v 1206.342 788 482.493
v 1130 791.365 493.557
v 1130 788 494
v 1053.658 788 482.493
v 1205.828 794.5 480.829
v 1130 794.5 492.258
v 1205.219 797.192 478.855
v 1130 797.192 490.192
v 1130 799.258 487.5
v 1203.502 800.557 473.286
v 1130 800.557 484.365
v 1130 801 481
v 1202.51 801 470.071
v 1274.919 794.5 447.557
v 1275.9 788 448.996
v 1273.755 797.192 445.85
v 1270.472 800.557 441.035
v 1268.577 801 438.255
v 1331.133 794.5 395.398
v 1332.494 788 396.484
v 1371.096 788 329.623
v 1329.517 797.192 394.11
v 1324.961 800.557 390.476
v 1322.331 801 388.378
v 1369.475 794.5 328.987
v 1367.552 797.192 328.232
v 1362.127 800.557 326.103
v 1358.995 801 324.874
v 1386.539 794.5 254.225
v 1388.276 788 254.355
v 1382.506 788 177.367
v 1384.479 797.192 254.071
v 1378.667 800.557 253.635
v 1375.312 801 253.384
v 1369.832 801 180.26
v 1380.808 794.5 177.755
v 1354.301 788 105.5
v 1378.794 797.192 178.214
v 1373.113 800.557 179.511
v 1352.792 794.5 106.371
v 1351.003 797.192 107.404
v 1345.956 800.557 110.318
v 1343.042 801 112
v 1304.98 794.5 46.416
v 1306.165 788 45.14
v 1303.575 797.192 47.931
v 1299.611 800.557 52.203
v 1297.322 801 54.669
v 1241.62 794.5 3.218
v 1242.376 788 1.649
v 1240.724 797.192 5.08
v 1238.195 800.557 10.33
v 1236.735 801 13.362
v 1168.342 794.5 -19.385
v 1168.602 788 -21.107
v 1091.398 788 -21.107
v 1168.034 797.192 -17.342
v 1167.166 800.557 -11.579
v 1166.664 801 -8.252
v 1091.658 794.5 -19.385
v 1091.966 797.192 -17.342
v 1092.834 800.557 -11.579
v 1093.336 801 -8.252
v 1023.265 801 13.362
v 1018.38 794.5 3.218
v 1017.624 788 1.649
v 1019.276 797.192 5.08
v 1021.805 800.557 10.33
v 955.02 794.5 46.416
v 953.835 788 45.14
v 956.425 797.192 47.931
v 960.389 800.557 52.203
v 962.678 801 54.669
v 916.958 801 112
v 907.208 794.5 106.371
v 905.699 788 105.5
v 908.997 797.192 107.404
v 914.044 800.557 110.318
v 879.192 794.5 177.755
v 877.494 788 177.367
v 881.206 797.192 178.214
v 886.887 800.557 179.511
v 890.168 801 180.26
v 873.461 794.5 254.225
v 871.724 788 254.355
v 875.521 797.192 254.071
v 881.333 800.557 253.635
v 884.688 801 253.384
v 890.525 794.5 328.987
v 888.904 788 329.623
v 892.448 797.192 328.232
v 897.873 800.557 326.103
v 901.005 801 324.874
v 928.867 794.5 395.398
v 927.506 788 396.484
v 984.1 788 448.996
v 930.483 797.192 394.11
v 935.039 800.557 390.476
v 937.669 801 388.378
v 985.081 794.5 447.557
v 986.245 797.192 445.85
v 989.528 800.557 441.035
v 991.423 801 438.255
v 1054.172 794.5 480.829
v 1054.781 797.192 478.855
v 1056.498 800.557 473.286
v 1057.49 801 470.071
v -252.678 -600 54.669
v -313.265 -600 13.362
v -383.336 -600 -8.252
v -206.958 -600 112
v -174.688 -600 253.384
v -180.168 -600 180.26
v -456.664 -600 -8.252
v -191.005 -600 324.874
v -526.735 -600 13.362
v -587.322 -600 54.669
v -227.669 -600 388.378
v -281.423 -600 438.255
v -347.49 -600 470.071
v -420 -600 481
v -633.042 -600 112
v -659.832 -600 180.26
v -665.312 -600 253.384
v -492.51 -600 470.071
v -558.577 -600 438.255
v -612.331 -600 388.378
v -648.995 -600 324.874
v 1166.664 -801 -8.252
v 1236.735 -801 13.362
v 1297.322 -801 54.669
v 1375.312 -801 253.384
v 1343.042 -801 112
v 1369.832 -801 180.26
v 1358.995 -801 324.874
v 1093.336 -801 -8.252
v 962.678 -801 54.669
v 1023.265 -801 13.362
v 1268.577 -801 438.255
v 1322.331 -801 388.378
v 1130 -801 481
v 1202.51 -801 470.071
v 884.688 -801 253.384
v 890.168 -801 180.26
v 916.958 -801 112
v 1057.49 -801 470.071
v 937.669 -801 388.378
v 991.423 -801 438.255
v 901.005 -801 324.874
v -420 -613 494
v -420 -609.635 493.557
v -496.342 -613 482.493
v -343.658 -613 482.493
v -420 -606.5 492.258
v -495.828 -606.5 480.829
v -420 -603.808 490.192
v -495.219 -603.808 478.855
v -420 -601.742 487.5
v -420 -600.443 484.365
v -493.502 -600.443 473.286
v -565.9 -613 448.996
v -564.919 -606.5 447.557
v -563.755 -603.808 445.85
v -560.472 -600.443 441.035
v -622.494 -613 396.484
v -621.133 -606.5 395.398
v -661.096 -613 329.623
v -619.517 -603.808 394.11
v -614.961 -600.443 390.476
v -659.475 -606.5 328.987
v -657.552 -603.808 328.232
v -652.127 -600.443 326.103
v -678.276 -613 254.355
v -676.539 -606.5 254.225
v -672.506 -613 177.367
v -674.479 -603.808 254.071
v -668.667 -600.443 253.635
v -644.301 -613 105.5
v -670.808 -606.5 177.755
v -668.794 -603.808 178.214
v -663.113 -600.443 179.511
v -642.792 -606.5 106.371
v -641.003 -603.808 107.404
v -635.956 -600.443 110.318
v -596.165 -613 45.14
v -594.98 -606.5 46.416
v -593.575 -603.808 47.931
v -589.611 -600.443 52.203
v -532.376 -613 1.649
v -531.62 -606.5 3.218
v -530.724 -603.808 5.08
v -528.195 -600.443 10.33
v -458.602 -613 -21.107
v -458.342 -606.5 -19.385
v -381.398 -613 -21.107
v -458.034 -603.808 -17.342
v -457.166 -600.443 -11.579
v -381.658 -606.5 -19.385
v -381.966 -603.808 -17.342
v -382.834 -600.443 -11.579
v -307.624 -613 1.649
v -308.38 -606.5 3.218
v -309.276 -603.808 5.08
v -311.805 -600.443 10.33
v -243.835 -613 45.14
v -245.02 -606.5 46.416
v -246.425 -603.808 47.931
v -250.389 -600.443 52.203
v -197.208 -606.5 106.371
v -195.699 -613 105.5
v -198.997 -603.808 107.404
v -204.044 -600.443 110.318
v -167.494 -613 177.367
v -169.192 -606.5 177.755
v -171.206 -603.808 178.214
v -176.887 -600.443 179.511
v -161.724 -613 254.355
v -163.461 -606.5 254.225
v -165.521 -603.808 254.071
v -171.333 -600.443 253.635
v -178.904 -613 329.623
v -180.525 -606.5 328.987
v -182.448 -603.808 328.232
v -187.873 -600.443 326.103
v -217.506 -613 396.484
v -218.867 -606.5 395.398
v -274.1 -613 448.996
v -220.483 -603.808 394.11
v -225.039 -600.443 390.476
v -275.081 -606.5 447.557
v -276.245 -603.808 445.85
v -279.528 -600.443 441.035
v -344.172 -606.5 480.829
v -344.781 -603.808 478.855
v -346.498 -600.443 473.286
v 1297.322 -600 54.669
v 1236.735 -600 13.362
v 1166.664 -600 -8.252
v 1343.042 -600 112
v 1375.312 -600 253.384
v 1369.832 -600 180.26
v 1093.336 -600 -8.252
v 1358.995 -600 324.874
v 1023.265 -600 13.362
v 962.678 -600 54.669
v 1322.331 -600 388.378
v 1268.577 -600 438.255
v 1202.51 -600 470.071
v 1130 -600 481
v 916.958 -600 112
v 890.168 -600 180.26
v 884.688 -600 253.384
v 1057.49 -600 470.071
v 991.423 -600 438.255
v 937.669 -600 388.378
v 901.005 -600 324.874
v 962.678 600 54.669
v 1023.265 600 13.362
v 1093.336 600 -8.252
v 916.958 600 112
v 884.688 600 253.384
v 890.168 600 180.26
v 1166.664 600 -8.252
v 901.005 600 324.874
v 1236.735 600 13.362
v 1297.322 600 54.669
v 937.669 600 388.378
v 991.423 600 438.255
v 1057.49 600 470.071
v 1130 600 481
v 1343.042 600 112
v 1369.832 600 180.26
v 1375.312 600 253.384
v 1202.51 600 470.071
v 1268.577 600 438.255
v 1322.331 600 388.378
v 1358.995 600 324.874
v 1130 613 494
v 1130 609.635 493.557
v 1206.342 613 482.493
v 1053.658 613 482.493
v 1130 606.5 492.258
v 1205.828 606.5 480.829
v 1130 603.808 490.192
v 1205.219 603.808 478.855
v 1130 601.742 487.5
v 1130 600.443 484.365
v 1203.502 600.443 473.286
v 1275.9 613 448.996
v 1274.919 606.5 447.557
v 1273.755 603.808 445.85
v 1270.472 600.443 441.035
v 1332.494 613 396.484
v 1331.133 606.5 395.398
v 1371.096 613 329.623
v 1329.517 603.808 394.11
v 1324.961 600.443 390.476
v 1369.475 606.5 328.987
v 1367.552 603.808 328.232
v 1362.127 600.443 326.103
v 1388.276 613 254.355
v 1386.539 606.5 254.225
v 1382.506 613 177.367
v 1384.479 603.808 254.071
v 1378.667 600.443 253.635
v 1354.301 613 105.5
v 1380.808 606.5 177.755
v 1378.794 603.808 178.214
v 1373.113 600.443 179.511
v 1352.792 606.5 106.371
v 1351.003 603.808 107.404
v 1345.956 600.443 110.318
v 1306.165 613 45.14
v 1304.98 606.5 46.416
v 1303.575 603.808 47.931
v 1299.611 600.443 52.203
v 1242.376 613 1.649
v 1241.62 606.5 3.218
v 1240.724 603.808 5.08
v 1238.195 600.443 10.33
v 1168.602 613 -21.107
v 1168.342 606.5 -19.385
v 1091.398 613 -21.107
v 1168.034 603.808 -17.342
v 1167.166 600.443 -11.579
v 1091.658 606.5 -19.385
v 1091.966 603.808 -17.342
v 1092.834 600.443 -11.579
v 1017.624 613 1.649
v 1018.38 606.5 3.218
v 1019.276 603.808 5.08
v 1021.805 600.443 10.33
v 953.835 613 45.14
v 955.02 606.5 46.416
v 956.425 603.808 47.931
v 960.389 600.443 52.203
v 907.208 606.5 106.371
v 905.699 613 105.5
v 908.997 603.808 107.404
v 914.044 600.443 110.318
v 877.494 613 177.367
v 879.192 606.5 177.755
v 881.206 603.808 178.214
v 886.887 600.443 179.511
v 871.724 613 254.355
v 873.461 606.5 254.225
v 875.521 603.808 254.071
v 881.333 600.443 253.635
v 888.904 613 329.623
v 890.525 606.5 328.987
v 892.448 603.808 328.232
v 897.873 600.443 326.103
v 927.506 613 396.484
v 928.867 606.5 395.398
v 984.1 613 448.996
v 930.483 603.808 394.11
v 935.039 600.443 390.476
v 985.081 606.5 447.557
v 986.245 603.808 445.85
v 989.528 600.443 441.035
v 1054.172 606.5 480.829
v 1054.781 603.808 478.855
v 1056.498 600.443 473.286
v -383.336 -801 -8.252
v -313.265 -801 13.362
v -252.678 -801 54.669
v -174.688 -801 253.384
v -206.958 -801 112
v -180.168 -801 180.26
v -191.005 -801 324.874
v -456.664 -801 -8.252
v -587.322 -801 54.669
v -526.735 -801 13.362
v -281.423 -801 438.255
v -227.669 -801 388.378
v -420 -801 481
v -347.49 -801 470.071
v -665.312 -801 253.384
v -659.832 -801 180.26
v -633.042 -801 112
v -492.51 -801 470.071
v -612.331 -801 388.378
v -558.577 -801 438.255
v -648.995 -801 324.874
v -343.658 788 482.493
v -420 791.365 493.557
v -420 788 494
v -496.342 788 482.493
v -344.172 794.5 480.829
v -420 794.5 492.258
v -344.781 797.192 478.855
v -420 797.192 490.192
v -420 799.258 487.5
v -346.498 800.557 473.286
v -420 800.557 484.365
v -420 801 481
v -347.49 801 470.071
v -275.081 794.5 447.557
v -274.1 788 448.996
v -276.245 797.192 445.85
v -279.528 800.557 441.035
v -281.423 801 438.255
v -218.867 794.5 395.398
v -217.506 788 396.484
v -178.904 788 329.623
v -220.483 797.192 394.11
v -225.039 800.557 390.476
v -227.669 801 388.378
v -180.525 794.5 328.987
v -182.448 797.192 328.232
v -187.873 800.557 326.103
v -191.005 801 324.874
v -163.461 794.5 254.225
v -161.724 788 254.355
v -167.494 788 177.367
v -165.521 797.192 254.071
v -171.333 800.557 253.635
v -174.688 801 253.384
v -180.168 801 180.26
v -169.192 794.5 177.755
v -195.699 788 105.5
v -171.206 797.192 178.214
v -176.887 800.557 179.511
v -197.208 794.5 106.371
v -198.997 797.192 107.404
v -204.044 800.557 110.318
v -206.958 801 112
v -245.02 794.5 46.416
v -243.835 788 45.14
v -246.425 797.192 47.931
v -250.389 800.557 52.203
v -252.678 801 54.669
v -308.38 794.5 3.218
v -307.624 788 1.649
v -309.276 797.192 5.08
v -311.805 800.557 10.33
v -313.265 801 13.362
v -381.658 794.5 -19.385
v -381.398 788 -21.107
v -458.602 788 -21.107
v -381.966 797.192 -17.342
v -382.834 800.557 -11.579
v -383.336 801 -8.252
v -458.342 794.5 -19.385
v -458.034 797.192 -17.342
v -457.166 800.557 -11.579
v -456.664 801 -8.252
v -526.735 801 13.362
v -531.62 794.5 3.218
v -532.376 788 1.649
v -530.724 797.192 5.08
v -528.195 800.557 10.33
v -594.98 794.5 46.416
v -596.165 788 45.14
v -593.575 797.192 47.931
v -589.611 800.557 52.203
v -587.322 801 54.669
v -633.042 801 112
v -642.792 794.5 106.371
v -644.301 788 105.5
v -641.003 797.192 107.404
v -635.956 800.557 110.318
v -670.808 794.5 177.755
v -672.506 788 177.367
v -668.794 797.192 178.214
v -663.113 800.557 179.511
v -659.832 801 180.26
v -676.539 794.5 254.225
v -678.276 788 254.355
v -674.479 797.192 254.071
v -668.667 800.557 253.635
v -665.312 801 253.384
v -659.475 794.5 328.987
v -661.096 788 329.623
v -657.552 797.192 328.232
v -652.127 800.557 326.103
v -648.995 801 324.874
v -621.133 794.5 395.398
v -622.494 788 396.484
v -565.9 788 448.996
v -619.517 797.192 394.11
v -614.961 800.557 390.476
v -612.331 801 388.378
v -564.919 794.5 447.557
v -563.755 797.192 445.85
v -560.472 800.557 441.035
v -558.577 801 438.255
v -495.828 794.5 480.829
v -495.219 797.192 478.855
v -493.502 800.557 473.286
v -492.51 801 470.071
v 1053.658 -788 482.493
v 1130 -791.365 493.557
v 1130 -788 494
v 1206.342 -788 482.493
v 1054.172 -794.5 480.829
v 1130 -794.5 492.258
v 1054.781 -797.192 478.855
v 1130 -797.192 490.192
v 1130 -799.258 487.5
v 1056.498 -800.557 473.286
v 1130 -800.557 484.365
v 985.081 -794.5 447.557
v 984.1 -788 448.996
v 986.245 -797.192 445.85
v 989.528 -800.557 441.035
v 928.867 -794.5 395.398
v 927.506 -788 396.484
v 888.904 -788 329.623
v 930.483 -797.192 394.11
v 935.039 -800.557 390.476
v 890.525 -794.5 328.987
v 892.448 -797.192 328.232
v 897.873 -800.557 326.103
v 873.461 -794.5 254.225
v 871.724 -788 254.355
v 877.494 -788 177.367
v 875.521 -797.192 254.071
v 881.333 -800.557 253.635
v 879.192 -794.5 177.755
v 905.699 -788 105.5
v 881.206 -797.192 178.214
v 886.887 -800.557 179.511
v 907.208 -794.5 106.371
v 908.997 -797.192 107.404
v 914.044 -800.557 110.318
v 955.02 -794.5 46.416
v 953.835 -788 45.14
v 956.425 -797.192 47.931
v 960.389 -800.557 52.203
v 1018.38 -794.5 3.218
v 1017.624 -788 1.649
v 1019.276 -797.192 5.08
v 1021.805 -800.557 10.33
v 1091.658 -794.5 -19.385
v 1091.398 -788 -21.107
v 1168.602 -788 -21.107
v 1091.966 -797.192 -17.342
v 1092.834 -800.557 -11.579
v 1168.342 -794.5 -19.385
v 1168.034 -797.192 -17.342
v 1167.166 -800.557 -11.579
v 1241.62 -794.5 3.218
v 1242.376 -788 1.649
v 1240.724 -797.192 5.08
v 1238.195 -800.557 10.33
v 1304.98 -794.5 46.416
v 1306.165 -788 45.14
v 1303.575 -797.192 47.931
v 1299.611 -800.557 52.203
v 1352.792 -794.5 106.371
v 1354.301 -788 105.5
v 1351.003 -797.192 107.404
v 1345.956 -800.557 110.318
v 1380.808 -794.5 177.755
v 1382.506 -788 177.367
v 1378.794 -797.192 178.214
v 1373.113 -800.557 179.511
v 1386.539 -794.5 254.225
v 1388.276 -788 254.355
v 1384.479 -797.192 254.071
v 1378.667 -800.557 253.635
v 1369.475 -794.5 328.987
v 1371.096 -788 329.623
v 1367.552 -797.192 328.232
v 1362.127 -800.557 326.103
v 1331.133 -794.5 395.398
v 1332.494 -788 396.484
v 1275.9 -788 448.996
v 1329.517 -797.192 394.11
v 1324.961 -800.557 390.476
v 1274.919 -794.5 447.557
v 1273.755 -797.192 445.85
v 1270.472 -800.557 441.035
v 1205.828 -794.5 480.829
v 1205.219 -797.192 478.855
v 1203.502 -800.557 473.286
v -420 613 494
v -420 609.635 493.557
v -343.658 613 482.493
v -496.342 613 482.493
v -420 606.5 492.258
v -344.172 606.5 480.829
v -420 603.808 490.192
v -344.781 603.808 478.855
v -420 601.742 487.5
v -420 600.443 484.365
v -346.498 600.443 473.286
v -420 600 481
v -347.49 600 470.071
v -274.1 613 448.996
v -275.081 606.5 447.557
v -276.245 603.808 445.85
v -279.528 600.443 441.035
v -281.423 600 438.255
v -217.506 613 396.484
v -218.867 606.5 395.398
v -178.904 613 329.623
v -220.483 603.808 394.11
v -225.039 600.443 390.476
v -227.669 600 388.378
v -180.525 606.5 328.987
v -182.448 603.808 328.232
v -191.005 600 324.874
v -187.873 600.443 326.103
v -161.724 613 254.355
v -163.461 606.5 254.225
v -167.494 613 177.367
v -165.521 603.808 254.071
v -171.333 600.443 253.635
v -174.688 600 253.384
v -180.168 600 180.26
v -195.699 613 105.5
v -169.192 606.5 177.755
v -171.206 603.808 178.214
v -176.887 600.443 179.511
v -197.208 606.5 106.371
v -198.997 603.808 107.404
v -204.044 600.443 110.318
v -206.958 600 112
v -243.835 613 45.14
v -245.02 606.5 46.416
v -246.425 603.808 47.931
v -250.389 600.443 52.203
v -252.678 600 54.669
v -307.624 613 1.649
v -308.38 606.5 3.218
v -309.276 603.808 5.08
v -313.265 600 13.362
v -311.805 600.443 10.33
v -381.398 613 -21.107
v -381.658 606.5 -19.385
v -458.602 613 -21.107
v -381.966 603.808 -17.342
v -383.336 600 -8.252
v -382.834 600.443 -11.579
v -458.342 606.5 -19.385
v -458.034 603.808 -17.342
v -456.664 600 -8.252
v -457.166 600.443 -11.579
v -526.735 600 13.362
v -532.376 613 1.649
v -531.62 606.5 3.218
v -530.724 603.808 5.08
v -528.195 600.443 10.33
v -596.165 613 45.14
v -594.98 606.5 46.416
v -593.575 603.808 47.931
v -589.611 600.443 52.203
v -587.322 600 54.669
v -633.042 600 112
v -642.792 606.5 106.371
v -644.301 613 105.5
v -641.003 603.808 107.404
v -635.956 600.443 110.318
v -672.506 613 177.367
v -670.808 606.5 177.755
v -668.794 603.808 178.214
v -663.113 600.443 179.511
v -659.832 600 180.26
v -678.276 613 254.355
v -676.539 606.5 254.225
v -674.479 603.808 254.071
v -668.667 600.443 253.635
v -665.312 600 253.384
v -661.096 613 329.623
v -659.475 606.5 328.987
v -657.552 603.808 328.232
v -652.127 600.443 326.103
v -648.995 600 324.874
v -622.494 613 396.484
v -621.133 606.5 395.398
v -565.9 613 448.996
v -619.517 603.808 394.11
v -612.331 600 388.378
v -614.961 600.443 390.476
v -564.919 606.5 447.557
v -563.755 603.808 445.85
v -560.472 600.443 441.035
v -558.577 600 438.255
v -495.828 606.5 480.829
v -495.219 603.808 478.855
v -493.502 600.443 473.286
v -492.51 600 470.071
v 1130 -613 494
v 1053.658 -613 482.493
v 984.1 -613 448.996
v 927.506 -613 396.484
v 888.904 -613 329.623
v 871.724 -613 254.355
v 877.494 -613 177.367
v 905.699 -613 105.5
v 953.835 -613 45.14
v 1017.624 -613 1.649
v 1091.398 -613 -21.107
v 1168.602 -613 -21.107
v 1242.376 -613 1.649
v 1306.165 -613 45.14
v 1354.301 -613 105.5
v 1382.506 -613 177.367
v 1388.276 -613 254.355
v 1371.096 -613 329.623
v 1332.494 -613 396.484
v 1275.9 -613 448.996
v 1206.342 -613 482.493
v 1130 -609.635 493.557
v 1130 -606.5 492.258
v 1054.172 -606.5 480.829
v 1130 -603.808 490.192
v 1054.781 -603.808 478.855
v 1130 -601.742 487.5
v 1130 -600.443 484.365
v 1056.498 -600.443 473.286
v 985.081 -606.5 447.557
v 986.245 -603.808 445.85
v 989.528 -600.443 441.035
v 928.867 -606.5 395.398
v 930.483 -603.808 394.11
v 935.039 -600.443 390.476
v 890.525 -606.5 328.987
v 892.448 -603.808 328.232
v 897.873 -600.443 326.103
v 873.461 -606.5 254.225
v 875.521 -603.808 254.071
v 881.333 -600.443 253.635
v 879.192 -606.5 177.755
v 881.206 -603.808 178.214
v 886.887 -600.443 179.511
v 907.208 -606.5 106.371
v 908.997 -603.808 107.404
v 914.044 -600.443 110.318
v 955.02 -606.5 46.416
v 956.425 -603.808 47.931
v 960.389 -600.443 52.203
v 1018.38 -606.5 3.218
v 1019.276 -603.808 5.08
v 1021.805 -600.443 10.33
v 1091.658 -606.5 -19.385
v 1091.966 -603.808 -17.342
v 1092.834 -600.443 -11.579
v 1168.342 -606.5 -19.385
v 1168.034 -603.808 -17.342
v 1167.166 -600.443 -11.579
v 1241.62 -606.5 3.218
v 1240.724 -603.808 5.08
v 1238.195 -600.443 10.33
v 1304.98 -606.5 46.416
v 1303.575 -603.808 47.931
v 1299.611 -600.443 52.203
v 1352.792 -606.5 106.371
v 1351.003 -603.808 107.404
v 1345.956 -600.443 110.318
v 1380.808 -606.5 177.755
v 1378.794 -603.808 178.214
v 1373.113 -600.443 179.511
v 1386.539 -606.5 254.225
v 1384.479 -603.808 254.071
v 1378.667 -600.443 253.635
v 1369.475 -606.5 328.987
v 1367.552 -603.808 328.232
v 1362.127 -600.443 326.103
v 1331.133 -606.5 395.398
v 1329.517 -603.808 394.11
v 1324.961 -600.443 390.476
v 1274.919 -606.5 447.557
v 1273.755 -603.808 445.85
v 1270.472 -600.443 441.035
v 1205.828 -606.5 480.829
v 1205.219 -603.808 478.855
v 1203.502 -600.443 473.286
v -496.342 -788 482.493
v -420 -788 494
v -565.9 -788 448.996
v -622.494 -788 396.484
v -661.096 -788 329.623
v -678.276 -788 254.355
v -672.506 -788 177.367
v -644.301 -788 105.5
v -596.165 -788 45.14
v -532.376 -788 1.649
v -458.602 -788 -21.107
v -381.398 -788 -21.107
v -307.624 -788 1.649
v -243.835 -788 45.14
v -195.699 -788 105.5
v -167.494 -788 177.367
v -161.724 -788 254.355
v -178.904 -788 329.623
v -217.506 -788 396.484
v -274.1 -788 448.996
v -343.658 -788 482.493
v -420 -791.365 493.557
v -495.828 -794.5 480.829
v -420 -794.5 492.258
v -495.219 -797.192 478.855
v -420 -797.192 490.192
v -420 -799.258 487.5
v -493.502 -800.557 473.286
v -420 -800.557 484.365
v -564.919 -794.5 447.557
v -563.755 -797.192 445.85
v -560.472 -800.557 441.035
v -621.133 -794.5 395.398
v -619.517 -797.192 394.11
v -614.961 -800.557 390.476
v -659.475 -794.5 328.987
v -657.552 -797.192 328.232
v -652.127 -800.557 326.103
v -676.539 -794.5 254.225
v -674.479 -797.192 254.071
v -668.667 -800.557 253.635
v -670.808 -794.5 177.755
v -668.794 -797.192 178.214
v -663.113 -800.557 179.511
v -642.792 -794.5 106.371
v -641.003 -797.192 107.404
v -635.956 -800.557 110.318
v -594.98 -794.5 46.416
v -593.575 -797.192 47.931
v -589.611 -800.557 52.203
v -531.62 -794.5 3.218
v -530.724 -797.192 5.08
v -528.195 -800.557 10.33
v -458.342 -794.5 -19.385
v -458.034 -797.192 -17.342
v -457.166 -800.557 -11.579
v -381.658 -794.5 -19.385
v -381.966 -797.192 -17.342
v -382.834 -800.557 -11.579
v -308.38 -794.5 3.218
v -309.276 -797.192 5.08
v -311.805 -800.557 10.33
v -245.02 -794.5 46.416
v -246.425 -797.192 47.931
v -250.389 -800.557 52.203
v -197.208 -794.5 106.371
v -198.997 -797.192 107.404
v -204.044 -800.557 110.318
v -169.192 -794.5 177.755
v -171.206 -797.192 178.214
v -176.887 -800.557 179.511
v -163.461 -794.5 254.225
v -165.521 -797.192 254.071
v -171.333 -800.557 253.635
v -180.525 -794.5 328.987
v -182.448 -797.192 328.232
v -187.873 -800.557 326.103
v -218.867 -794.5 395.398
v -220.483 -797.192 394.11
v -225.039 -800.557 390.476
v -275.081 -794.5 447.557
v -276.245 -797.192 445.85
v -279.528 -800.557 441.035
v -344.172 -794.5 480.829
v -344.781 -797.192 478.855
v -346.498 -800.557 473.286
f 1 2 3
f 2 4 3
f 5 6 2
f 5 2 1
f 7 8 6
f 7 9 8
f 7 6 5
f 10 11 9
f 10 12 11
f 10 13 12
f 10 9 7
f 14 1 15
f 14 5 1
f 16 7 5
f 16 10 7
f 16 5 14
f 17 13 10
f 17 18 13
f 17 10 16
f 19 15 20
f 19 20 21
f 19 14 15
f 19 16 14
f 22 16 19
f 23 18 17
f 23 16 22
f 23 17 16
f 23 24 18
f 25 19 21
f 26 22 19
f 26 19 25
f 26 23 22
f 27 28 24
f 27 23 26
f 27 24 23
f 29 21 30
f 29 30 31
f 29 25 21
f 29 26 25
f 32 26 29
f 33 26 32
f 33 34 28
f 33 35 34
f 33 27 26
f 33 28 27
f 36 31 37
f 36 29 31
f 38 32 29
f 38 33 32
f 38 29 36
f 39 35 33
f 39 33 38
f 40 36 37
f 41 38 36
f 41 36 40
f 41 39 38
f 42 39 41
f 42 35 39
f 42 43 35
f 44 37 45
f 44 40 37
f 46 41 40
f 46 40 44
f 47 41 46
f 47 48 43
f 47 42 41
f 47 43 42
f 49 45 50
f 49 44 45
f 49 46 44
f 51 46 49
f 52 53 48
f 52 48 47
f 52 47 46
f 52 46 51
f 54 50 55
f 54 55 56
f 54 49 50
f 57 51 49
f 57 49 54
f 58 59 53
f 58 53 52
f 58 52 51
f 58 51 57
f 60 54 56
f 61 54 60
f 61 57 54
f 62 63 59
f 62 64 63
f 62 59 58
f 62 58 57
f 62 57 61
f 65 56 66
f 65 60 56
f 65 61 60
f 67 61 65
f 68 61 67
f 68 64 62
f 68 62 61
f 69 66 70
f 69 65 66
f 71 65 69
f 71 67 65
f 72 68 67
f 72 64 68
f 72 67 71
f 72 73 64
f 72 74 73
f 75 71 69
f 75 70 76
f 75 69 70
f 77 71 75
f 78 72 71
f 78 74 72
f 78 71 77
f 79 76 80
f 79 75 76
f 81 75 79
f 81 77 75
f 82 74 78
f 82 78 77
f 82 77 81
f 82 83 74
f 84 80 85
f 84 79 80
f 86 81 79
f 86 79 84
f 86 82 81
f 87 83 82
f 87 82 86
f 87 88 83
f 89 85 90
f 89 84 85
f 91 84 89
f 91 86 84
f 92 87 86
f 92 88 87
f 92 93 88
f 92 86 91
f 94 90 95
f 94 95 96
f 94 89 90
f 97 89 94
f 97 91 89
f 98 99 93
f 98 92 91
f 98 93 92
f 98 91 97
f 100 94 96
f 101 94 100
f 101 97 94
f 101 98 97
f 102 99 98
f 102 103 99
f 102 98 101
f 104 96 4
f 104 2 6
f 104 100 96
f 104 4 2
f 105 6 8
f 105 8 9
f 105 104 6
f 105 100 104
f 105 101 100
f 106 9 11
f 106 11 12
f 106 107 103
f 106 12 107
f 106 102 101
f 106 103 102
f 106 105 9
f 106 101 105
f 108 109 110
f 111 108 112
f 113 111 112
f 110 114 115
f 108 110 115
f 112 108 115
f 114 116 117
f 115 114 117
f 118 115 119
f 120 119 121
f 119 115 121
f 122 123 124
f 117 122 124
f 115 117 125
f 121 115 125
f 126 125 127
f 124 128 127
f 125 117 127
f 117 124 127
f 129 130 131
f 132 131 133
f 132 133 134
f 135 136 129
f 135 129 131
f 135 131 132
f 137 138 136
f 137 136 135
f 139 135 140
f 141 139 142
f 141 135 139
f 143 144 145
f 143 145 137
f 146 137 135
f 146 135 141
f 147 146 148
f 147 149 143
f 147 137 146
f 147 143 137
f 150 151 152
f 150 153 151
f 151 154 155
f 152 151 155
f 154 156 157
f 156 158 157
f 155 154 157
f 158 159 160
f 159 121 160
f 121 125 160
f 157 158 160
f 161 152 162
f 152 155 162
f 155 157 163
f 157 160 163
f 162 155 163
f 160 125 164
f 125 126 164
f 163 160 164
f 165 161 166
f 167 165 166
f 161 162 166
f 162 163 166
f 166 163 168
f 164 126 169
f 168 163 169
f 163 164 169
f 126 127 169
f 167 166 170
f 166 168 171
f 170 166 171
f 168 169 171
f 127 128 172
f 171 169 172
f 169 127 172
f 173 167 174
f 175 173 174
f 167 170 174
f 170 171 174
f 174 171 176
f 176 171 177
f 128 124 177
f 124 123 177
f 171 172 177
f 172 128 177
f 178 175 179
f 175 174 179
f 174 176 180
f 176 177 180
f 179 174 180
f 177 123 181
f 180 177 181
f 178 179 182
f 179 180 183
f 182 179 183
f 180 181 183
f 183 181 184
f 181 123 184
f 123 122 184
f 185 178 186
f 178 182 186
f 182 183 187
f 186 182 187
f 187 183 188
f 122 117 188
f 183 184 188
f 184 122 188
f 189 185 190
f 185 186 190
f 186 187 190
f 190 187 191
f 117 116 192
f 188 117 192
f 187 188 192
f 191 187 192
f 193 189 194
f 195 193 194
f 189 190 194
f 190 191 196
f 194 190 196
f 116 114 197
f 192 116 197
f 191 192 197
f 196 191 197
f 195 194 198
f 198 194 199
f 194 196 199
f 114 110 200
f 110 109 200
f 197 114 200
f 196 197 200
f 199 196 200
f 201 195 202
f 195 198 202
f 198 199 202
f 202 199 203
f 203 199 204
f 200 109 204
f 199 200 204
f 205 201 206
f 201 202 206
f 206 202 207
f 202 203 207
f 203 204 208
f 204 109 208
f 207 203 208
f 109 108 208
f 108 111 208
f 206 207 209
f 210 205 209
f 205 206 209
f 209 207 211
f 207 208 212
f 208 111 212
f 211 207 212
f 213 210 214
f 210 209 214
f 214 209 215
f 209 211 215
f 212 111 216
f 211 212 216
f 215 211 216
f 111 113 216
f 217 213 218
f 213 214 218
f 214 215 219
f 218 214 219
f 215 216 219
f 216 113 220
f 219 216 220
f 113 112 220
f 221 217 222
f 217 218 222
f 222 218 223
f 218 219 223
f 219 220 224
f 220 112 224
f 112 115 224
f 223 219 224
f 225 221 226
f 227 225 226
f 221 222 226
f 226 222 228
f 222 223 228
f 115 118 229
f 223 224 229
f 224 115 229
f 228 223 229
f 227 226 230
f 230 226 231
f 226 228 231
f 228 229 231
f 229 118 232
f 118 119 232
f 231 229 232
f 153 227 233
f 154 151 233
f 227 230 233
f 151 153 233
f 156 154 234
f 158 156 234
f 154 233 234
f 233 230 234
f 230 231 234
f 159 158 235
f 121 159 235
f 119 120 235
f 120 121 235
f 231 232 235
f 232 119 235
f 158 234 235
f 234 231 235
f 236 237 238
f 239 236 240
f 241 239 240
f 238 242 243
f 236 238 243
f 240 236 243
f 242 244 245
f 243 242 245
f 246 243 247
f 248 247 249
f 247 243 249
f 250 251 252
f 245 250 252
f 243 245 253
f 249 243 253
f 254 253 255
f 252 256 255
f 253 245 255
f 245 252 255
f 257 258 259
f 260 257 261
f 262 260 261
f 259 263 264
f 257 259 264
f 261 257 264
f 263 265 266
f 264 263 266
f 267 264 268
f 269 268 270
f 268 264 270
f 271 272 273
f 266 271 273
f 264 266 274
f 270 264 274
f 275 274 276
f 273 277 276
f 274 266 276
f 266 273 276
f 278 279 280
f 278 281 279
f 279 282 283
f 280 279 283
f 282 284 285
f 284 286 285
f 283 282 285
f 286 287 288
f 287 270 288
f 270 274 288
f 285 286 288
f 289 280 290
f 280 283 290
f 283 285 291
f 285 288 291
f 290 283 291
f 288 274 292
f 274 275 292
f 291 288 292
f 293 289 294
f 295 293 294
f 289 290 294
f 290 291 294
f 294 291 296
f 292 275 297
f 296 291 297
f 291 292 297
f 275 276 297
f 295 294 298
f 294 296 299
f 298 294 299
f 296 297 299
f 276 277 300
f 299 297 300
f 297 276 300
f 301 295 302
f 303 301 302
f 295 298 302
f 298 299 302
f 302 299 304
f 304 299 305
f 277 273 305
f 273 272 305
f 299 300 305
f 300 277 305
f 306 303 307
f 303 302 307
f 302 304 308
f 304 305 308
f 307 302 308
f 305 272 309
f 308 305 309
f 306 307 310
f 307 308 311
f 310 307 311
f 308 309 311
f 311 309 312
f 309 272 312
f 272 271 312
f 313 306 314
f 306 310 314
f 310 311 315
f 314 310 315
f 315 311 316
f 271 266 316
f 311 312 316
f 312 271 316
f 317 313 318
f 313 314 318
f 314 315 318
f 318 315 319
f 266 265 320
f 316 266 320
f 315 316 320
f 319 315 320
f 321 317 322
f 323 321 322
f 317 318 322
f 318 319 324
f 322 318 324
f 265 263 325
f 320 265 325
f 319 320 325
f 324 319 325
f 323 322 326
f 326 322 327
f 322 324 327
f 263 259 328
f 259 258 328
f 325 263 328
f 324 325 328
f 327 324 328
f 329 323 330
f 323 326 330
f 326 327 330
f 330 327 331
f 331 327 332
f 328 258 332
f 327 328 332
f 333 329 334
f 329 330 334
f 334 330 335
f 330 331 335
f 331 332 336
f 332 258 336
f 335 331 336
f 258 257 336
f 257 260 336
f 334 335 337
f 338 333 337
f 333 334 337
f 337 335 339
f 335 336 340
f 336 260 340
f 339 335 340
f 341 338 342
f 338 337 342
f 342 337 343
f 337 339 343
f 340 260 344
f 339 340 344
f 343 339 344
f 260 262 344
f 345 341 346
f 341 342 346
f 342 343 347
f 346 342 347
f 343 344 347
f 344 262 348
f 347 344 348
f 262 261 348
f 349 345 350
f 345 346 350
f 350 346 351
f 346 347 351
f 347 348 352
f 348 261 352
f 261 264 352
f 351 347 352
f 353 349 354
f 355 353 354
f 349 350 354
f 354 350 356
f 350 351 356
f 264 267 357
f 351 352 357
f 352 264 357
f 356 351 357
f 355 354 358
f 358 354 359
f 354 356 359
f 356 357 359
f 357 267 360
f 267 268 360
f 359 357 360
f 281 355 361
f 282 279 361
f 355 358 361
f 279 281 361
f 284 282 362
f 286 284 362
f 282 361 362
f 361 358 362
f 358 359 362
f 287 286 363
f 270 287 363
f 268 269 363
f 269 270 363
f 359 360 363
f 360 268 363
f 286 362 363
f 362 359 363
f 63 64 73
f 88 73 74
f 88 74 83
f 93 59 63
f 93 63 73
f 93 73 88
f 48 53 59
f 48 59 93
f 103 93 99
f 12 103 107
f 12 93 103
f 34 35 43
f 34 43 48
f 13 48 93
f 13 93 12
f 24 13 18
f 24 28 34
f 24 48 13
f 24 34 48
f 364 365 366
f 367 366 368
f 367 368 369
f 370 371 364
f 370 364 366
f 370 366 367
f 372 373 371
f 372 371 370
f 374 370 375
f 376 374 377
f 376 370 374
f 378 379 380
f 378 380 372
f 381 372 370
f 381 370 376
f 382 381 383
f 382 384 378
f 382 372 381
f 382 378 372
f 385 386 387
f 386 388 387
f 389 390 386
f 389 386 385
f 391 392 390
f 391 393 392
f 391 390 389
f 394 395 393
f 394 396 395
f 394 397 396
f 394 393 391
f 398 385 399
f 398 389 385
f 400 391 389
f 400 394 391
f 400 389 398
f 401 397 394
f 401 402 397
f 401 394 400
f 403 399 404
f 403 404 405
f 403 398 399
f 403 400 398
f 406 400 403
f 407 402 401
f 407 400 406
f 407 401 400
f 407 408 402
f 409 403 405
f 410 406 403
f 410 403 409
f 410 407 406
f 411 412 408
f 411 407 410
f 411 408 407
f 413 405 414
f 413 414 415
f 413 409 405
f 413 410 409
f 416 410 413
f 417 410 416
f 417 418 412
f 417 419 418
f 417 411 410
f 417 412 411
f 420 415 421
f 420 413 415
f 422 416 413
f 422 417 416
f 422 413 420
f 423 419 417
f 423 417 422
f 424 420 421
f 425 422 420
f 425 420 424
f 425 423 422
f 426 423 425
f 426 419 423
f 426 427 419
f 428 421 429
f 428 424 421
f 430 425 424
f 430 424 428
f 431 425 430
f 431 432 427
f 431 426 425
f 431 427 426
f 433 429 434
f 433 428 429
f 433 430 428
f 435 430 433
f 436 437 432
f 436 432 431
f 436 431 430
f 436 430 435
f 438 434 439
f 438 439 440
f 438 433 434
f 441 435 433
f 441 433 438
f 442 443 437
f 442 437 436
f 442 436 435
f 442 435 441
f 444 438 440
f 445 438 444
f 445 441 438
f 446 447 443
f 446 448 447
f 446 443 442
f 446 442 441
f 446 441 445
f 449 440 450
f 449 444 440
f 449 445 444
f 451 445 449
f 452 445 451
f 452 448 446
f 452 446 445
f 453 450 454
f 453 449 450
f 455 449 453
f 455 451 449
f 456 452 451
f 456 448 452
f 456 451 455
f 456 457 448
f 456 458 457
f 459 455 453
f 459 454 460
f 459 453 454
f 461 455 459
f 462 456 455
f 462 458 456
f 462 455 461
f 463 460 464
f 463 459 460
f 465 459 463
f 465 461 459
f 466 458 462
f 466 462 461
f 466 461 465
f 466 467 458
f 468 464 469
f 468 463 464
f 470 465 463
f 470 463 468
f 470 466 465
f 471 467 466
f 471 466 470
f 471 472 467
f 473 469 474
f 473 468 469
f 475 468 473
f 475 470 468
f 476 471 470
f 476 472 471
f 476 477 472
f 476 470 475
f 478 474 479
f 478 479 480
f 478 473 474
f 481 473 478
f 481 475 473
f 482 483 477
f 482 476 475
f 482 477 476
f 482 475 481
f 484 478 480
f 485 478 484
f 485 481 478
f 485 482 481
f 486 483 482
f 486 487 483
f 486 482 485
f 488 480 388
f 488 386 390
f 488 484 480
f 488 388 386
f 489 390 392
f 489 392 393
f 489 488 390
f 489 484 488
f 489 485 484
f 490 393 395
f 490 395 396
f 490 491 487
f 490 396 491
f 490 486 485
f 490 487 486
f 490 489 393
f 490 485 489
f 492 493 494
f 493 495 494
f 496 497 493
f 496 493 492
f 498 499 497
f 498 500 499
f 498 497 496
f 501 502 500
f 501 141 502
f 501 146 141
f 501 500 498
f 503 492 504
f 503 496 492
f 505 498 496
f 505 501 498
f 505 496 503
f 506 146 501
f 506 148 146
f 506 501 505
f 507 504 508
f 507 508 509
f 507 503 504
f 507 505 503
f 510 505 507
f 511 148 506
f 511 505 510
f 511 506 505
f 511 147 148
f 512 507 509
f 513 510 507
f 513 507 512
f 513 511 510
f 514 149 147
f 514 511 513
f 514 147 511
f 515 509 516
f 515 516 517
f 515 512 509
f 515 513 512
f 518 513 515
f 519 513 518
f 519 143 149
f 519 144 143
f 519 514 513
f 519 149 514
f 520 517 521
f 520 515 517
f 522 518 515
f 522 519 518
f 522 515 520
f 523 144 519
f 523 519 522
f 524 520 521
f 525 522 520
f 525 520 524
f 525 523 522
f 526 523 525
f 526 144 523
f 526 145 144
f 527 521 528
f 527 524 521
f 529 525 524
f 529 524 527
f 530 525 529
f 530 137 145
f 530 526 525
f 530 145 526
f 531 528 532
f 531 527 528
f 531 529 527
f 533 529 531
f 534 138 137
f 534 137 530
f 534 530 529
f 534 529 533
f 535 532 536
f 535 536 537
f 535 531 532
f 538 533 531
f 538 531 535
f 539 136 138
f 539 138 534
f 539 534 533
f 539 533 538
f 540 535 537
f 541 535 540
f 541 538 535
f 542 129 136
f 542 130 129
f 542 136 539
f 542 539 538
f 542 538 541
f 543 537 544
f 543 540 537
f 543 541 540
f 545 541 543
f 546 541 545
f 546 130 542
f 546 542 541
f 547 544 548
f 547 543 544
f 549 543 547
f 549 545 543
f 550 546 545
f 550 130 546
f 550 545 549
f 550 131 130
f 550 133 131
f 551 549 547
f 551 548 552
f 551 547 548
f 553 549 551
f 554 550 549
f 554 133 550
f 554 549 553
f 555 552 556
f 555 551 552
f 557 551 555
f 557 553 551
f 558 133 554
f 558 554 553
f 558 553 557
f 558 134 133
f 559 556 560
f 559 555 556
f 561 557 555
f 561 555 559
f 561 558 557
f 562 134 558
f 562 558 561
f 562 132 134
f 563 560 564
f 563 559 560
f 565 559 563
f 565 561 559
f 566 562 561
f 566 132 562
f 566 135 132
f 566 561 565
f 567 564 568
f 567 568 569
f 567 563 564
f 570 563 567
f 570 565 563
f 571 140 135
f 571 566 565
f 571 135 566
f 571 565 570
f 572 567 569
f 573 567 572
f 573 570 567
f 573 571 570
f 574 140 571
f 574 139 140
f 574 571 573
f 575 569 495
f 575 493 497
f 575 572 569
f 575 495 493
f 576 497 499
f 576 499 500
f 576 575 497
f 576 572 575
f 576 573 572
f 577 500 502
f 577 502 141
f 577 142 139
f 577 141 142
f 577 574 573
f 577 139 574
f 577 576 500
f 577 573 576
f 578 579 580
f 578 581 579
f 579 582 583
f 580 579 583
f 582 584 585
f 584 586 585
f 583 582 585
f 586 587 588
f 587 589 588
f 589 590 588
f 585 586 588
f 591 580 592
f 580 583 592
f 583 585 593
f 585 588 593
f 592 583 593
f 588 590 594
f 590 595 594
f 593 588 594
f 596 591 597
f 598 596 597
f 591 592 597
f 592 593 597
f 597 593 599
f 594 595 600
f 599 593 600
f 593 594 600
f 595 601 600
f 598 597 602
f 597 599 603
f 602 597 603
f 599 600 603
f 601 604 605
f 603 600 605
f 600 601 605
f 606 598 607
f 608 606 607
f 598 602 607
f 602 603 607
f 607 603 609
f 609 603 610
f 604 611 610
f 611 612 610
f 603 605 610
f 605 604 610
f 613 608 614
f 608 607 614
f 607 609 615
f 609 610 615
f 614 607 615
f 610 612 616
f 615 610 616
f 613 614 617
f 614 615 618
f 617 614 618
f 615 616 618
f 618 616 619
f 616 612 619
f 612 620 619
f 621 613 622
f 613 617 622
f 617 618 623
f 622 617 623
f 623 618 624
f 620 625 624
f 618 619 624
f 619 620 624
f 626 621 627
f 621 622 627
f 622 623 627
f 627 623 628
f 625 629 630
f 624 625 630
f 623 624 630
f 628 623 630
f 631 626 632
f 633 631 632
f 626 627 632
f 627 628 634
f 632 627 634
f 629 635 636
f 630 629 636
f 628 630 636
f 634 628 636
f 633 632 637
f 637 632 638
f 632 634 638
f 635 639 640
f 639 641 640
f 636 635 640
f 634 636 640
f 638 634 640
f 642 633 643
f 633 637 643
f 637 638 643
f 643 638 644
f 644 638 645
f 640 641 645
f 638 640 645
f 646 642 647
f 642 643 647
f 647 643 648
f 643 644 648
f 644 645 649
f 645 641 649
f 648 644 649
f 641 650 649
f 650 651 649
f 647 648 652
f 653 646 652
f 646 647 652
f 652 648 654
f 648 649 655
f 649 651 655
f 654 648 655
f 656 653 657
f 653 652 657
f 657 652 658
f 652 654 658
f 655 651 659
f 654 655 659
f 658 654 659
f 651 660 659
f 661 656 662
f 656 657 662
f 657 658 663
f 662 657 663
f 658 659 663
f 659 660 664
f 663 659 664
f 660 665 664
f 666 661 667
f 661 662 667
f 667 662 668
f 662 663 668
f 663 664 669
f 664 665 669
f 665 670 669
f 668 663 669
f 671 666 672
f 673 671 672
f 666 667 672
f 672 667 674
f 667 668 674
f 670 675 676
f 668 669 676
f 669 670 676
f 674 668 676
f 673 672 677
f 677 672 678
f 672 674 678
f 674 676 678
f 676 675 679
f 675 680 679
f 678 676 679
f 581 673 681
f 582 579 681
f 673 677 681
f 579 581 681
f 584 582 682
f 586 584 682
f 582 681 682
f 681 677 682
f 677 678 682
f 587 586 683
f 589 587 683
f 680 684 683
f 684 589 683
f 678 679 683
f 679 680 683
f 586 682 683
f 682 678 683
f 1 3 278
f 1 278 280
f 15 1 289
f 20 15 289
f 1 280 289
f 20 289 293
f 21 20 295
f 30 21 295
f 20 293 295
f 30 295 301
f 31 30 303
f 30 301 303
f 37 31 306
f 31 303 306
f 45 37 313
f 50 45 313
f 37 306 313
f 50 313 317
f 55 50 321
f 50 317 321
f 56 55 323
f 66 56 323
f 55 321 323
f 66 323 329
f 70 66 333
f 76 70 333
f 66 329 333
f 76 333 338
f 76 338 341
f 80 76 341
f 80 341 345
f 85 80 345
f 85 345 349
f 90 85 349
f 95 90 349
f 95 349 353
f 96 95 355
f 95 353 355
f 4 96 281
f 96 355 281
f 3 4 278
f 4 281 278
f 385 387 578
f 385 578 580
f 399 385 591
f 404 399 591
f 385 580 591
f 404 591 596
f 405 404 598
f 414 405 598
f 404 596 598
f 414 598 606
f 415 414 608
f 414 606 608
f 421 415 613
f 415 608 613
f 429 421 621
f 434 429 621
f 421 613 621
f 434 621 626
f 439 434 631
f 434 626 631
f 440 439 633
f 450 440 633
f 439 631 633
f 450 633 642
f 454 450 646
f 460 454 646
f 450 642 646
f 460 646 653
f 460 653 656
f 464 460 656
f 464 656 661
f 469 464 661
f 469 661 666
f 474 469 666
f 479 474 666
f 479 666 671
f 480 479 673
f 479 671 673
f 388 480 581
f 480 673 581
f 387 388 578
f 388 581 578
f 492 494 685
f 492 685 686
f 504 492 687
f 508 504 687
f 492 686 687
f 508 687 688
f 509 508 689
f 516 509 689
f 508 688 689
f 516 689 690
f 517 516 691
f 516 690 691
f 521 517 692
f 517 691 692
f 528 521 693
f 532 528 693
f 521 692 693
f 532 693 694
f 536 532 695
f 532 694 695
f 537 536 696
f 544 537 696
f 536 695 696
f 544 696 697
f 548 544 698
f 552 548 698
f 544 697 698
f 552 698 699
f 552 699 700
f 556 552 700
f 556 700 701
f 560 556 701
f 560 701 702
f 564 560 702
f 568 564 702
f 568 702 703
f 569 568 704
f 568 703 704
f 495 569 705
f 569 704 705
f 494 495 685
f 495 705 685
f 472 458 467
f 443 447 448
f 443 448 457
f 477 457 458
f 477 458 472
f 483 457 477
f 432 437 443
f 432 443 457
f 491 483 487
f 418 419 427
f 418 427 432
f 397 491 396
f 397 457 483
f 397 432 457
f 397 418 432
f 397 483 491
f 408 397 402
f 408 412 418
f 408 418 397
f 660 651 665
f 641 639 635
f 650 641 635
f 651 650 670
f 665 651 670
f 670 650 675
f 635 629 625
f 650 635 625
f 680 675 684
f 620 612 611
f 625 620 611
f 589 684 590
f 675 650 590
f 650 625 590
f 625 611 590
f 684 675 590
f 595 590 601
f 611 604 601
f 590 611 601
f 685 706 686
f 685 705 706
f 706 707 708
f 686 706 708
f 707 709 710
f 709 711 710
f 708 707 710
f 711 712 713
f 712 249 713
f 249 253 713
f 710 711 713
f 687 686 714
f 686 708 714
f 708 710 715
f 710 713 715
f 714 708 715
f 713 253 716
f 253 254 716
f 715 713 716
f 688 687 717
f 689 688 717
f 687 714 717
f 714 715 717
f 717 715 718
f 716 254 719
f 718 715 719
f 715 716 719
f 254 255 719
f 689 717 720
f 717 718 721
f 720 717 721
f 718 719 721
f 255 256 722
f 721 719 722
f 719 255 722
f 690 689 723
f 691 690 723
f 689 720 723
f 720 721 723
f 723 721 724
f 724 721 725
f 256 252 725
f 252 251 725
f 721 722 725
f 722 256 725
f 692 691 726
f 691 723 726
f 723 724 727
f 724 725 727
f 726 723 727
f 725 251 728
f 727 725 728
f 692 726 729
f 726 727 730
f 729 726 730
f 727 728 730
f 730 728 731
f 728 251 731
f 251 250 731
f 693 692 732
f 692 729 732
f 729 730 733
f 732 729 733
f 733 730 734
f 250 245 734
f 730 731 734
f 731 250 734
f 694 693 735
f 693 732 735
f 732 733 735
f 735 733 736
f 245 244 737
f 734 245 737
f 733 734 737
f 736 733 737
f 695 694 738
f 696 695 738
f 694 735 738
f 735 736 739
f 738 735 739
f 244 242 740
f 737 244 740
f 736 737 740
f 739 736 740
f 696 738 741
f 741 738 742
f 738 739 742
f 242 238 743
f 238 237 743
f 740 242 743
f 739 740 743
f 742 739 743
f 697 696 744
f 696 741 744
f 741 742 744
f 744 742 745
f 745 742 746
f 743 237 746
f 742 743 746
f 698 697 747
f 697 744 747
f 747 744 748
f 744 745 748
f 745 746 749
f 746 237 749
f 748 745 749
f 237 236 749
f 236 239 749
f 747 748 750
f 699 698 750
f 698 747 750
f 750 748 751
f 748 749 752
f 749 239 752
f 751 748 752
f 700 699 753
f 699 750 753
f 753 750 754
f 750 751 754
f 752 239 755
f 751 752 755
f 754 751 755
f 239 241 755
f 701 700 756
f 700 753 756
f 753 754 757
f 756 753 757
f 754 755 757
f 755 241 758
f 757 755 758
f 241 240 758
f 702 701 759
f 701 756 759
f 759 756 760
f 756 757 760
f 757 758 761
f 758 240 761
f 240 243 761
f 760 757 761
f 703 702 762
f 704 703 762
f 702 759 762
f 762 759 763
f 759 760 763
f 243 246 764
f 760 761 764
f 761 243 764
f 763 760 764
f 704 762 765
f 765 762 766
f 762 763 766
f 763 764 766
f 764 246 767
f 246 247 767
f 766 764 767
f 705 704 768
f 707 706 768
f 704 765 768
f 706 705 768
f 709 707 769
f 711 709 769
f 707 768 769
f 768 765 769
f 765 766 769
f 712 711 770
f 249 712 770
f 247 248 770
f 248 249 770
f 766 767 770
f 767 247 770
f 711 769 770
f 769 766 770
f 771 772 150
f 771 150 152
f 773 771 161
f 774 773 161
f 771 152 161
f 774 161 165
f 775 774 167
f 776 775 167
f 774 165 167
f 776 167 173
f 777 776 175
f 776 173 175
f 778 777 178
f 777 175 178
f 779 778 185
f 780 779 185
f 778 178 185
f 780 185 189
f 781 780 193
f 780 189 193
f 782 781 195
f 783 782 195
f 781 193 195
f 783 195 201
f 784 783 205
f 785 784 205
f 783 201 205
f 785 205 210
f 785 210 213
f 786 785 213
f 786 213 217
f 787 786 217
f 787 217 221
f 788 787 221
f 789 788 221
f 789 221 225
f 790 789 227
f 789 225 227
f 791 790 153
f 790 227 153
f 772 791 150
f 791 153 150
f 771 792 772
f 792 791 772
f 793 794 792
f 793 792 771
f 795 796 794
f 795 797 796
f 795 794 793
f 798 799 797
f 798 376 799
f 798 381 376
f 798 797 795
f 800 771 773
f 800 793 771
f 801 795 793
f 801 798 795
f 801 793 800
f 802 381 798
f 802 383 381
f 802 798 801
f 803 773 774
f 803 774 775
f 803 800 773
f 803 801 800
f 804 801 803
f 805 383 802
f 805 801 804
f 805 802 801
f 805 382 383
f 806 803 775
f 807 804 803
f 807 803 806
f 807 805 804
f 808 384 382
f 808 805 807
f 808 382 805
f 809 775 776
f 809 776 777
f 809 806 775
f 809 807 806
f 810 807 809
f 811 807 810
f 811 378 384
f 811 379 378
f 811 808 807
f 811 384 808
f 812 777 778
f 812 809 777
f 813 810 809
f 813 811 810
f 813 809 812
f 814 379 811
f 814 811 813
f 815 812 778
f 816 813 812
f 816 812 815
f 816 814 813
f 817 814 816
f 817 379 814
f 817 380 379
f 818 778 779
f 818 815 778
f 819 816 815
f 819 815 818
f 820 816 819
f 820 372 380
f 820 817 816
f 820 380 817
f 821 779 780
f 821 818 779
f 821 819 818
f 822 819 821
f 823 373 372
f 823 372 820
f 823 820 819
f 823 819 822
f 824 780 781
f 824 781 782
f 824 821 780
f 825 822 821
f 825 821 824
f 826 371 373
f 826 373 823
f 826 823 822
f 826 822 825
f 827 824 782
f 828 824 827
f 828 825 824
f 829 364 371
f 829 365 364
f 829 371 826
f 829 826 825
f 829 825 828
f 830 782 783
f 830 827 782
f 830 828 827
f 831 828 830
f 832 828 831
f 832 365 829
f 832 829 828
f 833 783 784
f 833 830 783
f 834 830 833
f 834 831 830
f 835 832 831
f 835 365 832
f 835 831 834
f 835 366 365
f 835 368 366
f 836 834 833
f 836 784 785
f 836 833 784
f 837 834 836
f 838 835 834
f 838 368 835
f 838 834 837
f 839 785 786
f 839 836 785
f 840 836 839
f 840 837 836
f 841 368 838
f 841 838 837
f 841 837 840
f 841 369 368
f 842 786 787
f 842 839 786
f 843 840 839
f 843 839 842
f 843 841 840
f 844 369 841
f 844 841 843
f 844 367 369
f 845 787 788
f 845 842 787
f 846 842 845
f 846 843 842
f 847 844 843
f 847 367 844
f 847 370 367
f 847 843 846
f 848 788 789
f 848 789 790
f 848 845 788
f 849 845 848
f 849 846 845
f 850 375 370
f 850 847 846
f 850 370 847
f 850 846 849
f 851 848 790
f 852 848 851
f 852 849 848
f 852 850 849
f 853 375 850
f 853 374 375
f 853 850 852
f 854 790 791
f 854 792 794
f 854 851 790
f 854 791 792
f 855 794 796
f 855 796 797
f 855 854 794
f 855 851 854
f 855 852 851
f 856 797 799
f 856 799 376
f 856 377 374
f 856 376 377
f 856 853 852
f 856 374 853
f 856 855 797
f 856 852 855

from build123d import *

# Parameters (mm, degrees)
F_3D_SKETCH_1_R      = 259
LEFT_WHEELS_DEPTH    = 201
LEFT_WHEELS_2_DEPTH  = 201
FILLET1_R            = 13
FILLET2_R            = 13
F_3DSKETCH3_R        = 259
RIGHT_WHEELS_DEPTH   = 201
RIGHT_WHEELS_2_DEPTH = 201
FILLET4_R            = 13
FILLET3_R            = 13


with BuildPart() as part:
    # 3D Sketch 1 → Left Wheels (new body)
    with BuildSketch(Plane(origin=(-420, -600, 235), x_dir=(1, 0, 0), z_dir=(0, -1, 0))):
        with Locations(Location((0, 0, 0), (0, 0, 90))):
            Circle(F_3D_SKETCH_1_R)
    extrude(amount=LEFT_WHEELS_DEPTH)

    # Fillet2
    fillet2_edges = [part.edges().sort_by_distance(p)[0] for p in [
        (-420, -801, -24),
        (-420, -600, -24),
    ]]
    fillet(fillet2_edges, radius=FILLET2_R)


with BuildPart() as body_2:
    # 3D Sketch 1 → Left Wheels 2 (new body)
    with BuildSketch(Plane(origin=(-420, -600, 235), x_dir=(1, 0, 0), z_dir=(0, -1, 0))):
        with Locations(Location((1550, 0, 0), (0, 0, 90))):
            Circle(F_3D_SKETCH_1_R)
    extrude(amount=LEFT_WHEELS_2_DEPTH)

    # Fillet1
    fillet1_edges = [body_2.edges().sort_by_distance(p)[0] for p in [
        (1130, -801, -24),
        (1130, -600, -24),
    ]]
    fillet(fillet1_edges, radius=FILLET1_R)


with BuildPart() as body_3:
    # 3DSketch3 → Right Wheels (new body)
    with BuildSketch(Plane(origin=(1130, 600, 235), x_dir=(-1, 0, 0), z_dir=(0, 1, 0))):
        with Locations(Location((0, 0, 0), (0, 0, 90))):
            Circle(F_3DSKETCH3_R)
    extrude(amount=RIGHT_WHEELS_DEPTH)

    # Fillet3
    fillet3_edges = [body_3.edges().sort_by_distance(p)[0] for p in [
        (1130, 801, -24),
        (1130, 600, -24),
    ]]
    fillet(fillet3_edges, radius=FILLET3_R)


with BuildPart() as body_4:
    # 3DSketch3 → Right Wheels 2 (new body)
    with BuildSketch(Plane(origin=(1130, 600, 235), x_dir=(-1, 0, 0), z_dir=(0, 1, 0))):
        with Locations(Location((1550, 0, 0), (0, 0, 90))):
            Circle(F_3DSKETCH3_R)
    extrude(amount=RIGHT_WHEELS_2_DEPTH)

    # Fillet4
    fillet4_edges = [body_4.edges().sort_by_distance(p)[0] for p in [
        (-420, 801, -24),
        (-420, 600, -24),
    ]]
    fillet(fillet4_edges, radius=FILLET4_R)


solid = Compound([part.part, body_2.part, body_3.part, body_4.part])
